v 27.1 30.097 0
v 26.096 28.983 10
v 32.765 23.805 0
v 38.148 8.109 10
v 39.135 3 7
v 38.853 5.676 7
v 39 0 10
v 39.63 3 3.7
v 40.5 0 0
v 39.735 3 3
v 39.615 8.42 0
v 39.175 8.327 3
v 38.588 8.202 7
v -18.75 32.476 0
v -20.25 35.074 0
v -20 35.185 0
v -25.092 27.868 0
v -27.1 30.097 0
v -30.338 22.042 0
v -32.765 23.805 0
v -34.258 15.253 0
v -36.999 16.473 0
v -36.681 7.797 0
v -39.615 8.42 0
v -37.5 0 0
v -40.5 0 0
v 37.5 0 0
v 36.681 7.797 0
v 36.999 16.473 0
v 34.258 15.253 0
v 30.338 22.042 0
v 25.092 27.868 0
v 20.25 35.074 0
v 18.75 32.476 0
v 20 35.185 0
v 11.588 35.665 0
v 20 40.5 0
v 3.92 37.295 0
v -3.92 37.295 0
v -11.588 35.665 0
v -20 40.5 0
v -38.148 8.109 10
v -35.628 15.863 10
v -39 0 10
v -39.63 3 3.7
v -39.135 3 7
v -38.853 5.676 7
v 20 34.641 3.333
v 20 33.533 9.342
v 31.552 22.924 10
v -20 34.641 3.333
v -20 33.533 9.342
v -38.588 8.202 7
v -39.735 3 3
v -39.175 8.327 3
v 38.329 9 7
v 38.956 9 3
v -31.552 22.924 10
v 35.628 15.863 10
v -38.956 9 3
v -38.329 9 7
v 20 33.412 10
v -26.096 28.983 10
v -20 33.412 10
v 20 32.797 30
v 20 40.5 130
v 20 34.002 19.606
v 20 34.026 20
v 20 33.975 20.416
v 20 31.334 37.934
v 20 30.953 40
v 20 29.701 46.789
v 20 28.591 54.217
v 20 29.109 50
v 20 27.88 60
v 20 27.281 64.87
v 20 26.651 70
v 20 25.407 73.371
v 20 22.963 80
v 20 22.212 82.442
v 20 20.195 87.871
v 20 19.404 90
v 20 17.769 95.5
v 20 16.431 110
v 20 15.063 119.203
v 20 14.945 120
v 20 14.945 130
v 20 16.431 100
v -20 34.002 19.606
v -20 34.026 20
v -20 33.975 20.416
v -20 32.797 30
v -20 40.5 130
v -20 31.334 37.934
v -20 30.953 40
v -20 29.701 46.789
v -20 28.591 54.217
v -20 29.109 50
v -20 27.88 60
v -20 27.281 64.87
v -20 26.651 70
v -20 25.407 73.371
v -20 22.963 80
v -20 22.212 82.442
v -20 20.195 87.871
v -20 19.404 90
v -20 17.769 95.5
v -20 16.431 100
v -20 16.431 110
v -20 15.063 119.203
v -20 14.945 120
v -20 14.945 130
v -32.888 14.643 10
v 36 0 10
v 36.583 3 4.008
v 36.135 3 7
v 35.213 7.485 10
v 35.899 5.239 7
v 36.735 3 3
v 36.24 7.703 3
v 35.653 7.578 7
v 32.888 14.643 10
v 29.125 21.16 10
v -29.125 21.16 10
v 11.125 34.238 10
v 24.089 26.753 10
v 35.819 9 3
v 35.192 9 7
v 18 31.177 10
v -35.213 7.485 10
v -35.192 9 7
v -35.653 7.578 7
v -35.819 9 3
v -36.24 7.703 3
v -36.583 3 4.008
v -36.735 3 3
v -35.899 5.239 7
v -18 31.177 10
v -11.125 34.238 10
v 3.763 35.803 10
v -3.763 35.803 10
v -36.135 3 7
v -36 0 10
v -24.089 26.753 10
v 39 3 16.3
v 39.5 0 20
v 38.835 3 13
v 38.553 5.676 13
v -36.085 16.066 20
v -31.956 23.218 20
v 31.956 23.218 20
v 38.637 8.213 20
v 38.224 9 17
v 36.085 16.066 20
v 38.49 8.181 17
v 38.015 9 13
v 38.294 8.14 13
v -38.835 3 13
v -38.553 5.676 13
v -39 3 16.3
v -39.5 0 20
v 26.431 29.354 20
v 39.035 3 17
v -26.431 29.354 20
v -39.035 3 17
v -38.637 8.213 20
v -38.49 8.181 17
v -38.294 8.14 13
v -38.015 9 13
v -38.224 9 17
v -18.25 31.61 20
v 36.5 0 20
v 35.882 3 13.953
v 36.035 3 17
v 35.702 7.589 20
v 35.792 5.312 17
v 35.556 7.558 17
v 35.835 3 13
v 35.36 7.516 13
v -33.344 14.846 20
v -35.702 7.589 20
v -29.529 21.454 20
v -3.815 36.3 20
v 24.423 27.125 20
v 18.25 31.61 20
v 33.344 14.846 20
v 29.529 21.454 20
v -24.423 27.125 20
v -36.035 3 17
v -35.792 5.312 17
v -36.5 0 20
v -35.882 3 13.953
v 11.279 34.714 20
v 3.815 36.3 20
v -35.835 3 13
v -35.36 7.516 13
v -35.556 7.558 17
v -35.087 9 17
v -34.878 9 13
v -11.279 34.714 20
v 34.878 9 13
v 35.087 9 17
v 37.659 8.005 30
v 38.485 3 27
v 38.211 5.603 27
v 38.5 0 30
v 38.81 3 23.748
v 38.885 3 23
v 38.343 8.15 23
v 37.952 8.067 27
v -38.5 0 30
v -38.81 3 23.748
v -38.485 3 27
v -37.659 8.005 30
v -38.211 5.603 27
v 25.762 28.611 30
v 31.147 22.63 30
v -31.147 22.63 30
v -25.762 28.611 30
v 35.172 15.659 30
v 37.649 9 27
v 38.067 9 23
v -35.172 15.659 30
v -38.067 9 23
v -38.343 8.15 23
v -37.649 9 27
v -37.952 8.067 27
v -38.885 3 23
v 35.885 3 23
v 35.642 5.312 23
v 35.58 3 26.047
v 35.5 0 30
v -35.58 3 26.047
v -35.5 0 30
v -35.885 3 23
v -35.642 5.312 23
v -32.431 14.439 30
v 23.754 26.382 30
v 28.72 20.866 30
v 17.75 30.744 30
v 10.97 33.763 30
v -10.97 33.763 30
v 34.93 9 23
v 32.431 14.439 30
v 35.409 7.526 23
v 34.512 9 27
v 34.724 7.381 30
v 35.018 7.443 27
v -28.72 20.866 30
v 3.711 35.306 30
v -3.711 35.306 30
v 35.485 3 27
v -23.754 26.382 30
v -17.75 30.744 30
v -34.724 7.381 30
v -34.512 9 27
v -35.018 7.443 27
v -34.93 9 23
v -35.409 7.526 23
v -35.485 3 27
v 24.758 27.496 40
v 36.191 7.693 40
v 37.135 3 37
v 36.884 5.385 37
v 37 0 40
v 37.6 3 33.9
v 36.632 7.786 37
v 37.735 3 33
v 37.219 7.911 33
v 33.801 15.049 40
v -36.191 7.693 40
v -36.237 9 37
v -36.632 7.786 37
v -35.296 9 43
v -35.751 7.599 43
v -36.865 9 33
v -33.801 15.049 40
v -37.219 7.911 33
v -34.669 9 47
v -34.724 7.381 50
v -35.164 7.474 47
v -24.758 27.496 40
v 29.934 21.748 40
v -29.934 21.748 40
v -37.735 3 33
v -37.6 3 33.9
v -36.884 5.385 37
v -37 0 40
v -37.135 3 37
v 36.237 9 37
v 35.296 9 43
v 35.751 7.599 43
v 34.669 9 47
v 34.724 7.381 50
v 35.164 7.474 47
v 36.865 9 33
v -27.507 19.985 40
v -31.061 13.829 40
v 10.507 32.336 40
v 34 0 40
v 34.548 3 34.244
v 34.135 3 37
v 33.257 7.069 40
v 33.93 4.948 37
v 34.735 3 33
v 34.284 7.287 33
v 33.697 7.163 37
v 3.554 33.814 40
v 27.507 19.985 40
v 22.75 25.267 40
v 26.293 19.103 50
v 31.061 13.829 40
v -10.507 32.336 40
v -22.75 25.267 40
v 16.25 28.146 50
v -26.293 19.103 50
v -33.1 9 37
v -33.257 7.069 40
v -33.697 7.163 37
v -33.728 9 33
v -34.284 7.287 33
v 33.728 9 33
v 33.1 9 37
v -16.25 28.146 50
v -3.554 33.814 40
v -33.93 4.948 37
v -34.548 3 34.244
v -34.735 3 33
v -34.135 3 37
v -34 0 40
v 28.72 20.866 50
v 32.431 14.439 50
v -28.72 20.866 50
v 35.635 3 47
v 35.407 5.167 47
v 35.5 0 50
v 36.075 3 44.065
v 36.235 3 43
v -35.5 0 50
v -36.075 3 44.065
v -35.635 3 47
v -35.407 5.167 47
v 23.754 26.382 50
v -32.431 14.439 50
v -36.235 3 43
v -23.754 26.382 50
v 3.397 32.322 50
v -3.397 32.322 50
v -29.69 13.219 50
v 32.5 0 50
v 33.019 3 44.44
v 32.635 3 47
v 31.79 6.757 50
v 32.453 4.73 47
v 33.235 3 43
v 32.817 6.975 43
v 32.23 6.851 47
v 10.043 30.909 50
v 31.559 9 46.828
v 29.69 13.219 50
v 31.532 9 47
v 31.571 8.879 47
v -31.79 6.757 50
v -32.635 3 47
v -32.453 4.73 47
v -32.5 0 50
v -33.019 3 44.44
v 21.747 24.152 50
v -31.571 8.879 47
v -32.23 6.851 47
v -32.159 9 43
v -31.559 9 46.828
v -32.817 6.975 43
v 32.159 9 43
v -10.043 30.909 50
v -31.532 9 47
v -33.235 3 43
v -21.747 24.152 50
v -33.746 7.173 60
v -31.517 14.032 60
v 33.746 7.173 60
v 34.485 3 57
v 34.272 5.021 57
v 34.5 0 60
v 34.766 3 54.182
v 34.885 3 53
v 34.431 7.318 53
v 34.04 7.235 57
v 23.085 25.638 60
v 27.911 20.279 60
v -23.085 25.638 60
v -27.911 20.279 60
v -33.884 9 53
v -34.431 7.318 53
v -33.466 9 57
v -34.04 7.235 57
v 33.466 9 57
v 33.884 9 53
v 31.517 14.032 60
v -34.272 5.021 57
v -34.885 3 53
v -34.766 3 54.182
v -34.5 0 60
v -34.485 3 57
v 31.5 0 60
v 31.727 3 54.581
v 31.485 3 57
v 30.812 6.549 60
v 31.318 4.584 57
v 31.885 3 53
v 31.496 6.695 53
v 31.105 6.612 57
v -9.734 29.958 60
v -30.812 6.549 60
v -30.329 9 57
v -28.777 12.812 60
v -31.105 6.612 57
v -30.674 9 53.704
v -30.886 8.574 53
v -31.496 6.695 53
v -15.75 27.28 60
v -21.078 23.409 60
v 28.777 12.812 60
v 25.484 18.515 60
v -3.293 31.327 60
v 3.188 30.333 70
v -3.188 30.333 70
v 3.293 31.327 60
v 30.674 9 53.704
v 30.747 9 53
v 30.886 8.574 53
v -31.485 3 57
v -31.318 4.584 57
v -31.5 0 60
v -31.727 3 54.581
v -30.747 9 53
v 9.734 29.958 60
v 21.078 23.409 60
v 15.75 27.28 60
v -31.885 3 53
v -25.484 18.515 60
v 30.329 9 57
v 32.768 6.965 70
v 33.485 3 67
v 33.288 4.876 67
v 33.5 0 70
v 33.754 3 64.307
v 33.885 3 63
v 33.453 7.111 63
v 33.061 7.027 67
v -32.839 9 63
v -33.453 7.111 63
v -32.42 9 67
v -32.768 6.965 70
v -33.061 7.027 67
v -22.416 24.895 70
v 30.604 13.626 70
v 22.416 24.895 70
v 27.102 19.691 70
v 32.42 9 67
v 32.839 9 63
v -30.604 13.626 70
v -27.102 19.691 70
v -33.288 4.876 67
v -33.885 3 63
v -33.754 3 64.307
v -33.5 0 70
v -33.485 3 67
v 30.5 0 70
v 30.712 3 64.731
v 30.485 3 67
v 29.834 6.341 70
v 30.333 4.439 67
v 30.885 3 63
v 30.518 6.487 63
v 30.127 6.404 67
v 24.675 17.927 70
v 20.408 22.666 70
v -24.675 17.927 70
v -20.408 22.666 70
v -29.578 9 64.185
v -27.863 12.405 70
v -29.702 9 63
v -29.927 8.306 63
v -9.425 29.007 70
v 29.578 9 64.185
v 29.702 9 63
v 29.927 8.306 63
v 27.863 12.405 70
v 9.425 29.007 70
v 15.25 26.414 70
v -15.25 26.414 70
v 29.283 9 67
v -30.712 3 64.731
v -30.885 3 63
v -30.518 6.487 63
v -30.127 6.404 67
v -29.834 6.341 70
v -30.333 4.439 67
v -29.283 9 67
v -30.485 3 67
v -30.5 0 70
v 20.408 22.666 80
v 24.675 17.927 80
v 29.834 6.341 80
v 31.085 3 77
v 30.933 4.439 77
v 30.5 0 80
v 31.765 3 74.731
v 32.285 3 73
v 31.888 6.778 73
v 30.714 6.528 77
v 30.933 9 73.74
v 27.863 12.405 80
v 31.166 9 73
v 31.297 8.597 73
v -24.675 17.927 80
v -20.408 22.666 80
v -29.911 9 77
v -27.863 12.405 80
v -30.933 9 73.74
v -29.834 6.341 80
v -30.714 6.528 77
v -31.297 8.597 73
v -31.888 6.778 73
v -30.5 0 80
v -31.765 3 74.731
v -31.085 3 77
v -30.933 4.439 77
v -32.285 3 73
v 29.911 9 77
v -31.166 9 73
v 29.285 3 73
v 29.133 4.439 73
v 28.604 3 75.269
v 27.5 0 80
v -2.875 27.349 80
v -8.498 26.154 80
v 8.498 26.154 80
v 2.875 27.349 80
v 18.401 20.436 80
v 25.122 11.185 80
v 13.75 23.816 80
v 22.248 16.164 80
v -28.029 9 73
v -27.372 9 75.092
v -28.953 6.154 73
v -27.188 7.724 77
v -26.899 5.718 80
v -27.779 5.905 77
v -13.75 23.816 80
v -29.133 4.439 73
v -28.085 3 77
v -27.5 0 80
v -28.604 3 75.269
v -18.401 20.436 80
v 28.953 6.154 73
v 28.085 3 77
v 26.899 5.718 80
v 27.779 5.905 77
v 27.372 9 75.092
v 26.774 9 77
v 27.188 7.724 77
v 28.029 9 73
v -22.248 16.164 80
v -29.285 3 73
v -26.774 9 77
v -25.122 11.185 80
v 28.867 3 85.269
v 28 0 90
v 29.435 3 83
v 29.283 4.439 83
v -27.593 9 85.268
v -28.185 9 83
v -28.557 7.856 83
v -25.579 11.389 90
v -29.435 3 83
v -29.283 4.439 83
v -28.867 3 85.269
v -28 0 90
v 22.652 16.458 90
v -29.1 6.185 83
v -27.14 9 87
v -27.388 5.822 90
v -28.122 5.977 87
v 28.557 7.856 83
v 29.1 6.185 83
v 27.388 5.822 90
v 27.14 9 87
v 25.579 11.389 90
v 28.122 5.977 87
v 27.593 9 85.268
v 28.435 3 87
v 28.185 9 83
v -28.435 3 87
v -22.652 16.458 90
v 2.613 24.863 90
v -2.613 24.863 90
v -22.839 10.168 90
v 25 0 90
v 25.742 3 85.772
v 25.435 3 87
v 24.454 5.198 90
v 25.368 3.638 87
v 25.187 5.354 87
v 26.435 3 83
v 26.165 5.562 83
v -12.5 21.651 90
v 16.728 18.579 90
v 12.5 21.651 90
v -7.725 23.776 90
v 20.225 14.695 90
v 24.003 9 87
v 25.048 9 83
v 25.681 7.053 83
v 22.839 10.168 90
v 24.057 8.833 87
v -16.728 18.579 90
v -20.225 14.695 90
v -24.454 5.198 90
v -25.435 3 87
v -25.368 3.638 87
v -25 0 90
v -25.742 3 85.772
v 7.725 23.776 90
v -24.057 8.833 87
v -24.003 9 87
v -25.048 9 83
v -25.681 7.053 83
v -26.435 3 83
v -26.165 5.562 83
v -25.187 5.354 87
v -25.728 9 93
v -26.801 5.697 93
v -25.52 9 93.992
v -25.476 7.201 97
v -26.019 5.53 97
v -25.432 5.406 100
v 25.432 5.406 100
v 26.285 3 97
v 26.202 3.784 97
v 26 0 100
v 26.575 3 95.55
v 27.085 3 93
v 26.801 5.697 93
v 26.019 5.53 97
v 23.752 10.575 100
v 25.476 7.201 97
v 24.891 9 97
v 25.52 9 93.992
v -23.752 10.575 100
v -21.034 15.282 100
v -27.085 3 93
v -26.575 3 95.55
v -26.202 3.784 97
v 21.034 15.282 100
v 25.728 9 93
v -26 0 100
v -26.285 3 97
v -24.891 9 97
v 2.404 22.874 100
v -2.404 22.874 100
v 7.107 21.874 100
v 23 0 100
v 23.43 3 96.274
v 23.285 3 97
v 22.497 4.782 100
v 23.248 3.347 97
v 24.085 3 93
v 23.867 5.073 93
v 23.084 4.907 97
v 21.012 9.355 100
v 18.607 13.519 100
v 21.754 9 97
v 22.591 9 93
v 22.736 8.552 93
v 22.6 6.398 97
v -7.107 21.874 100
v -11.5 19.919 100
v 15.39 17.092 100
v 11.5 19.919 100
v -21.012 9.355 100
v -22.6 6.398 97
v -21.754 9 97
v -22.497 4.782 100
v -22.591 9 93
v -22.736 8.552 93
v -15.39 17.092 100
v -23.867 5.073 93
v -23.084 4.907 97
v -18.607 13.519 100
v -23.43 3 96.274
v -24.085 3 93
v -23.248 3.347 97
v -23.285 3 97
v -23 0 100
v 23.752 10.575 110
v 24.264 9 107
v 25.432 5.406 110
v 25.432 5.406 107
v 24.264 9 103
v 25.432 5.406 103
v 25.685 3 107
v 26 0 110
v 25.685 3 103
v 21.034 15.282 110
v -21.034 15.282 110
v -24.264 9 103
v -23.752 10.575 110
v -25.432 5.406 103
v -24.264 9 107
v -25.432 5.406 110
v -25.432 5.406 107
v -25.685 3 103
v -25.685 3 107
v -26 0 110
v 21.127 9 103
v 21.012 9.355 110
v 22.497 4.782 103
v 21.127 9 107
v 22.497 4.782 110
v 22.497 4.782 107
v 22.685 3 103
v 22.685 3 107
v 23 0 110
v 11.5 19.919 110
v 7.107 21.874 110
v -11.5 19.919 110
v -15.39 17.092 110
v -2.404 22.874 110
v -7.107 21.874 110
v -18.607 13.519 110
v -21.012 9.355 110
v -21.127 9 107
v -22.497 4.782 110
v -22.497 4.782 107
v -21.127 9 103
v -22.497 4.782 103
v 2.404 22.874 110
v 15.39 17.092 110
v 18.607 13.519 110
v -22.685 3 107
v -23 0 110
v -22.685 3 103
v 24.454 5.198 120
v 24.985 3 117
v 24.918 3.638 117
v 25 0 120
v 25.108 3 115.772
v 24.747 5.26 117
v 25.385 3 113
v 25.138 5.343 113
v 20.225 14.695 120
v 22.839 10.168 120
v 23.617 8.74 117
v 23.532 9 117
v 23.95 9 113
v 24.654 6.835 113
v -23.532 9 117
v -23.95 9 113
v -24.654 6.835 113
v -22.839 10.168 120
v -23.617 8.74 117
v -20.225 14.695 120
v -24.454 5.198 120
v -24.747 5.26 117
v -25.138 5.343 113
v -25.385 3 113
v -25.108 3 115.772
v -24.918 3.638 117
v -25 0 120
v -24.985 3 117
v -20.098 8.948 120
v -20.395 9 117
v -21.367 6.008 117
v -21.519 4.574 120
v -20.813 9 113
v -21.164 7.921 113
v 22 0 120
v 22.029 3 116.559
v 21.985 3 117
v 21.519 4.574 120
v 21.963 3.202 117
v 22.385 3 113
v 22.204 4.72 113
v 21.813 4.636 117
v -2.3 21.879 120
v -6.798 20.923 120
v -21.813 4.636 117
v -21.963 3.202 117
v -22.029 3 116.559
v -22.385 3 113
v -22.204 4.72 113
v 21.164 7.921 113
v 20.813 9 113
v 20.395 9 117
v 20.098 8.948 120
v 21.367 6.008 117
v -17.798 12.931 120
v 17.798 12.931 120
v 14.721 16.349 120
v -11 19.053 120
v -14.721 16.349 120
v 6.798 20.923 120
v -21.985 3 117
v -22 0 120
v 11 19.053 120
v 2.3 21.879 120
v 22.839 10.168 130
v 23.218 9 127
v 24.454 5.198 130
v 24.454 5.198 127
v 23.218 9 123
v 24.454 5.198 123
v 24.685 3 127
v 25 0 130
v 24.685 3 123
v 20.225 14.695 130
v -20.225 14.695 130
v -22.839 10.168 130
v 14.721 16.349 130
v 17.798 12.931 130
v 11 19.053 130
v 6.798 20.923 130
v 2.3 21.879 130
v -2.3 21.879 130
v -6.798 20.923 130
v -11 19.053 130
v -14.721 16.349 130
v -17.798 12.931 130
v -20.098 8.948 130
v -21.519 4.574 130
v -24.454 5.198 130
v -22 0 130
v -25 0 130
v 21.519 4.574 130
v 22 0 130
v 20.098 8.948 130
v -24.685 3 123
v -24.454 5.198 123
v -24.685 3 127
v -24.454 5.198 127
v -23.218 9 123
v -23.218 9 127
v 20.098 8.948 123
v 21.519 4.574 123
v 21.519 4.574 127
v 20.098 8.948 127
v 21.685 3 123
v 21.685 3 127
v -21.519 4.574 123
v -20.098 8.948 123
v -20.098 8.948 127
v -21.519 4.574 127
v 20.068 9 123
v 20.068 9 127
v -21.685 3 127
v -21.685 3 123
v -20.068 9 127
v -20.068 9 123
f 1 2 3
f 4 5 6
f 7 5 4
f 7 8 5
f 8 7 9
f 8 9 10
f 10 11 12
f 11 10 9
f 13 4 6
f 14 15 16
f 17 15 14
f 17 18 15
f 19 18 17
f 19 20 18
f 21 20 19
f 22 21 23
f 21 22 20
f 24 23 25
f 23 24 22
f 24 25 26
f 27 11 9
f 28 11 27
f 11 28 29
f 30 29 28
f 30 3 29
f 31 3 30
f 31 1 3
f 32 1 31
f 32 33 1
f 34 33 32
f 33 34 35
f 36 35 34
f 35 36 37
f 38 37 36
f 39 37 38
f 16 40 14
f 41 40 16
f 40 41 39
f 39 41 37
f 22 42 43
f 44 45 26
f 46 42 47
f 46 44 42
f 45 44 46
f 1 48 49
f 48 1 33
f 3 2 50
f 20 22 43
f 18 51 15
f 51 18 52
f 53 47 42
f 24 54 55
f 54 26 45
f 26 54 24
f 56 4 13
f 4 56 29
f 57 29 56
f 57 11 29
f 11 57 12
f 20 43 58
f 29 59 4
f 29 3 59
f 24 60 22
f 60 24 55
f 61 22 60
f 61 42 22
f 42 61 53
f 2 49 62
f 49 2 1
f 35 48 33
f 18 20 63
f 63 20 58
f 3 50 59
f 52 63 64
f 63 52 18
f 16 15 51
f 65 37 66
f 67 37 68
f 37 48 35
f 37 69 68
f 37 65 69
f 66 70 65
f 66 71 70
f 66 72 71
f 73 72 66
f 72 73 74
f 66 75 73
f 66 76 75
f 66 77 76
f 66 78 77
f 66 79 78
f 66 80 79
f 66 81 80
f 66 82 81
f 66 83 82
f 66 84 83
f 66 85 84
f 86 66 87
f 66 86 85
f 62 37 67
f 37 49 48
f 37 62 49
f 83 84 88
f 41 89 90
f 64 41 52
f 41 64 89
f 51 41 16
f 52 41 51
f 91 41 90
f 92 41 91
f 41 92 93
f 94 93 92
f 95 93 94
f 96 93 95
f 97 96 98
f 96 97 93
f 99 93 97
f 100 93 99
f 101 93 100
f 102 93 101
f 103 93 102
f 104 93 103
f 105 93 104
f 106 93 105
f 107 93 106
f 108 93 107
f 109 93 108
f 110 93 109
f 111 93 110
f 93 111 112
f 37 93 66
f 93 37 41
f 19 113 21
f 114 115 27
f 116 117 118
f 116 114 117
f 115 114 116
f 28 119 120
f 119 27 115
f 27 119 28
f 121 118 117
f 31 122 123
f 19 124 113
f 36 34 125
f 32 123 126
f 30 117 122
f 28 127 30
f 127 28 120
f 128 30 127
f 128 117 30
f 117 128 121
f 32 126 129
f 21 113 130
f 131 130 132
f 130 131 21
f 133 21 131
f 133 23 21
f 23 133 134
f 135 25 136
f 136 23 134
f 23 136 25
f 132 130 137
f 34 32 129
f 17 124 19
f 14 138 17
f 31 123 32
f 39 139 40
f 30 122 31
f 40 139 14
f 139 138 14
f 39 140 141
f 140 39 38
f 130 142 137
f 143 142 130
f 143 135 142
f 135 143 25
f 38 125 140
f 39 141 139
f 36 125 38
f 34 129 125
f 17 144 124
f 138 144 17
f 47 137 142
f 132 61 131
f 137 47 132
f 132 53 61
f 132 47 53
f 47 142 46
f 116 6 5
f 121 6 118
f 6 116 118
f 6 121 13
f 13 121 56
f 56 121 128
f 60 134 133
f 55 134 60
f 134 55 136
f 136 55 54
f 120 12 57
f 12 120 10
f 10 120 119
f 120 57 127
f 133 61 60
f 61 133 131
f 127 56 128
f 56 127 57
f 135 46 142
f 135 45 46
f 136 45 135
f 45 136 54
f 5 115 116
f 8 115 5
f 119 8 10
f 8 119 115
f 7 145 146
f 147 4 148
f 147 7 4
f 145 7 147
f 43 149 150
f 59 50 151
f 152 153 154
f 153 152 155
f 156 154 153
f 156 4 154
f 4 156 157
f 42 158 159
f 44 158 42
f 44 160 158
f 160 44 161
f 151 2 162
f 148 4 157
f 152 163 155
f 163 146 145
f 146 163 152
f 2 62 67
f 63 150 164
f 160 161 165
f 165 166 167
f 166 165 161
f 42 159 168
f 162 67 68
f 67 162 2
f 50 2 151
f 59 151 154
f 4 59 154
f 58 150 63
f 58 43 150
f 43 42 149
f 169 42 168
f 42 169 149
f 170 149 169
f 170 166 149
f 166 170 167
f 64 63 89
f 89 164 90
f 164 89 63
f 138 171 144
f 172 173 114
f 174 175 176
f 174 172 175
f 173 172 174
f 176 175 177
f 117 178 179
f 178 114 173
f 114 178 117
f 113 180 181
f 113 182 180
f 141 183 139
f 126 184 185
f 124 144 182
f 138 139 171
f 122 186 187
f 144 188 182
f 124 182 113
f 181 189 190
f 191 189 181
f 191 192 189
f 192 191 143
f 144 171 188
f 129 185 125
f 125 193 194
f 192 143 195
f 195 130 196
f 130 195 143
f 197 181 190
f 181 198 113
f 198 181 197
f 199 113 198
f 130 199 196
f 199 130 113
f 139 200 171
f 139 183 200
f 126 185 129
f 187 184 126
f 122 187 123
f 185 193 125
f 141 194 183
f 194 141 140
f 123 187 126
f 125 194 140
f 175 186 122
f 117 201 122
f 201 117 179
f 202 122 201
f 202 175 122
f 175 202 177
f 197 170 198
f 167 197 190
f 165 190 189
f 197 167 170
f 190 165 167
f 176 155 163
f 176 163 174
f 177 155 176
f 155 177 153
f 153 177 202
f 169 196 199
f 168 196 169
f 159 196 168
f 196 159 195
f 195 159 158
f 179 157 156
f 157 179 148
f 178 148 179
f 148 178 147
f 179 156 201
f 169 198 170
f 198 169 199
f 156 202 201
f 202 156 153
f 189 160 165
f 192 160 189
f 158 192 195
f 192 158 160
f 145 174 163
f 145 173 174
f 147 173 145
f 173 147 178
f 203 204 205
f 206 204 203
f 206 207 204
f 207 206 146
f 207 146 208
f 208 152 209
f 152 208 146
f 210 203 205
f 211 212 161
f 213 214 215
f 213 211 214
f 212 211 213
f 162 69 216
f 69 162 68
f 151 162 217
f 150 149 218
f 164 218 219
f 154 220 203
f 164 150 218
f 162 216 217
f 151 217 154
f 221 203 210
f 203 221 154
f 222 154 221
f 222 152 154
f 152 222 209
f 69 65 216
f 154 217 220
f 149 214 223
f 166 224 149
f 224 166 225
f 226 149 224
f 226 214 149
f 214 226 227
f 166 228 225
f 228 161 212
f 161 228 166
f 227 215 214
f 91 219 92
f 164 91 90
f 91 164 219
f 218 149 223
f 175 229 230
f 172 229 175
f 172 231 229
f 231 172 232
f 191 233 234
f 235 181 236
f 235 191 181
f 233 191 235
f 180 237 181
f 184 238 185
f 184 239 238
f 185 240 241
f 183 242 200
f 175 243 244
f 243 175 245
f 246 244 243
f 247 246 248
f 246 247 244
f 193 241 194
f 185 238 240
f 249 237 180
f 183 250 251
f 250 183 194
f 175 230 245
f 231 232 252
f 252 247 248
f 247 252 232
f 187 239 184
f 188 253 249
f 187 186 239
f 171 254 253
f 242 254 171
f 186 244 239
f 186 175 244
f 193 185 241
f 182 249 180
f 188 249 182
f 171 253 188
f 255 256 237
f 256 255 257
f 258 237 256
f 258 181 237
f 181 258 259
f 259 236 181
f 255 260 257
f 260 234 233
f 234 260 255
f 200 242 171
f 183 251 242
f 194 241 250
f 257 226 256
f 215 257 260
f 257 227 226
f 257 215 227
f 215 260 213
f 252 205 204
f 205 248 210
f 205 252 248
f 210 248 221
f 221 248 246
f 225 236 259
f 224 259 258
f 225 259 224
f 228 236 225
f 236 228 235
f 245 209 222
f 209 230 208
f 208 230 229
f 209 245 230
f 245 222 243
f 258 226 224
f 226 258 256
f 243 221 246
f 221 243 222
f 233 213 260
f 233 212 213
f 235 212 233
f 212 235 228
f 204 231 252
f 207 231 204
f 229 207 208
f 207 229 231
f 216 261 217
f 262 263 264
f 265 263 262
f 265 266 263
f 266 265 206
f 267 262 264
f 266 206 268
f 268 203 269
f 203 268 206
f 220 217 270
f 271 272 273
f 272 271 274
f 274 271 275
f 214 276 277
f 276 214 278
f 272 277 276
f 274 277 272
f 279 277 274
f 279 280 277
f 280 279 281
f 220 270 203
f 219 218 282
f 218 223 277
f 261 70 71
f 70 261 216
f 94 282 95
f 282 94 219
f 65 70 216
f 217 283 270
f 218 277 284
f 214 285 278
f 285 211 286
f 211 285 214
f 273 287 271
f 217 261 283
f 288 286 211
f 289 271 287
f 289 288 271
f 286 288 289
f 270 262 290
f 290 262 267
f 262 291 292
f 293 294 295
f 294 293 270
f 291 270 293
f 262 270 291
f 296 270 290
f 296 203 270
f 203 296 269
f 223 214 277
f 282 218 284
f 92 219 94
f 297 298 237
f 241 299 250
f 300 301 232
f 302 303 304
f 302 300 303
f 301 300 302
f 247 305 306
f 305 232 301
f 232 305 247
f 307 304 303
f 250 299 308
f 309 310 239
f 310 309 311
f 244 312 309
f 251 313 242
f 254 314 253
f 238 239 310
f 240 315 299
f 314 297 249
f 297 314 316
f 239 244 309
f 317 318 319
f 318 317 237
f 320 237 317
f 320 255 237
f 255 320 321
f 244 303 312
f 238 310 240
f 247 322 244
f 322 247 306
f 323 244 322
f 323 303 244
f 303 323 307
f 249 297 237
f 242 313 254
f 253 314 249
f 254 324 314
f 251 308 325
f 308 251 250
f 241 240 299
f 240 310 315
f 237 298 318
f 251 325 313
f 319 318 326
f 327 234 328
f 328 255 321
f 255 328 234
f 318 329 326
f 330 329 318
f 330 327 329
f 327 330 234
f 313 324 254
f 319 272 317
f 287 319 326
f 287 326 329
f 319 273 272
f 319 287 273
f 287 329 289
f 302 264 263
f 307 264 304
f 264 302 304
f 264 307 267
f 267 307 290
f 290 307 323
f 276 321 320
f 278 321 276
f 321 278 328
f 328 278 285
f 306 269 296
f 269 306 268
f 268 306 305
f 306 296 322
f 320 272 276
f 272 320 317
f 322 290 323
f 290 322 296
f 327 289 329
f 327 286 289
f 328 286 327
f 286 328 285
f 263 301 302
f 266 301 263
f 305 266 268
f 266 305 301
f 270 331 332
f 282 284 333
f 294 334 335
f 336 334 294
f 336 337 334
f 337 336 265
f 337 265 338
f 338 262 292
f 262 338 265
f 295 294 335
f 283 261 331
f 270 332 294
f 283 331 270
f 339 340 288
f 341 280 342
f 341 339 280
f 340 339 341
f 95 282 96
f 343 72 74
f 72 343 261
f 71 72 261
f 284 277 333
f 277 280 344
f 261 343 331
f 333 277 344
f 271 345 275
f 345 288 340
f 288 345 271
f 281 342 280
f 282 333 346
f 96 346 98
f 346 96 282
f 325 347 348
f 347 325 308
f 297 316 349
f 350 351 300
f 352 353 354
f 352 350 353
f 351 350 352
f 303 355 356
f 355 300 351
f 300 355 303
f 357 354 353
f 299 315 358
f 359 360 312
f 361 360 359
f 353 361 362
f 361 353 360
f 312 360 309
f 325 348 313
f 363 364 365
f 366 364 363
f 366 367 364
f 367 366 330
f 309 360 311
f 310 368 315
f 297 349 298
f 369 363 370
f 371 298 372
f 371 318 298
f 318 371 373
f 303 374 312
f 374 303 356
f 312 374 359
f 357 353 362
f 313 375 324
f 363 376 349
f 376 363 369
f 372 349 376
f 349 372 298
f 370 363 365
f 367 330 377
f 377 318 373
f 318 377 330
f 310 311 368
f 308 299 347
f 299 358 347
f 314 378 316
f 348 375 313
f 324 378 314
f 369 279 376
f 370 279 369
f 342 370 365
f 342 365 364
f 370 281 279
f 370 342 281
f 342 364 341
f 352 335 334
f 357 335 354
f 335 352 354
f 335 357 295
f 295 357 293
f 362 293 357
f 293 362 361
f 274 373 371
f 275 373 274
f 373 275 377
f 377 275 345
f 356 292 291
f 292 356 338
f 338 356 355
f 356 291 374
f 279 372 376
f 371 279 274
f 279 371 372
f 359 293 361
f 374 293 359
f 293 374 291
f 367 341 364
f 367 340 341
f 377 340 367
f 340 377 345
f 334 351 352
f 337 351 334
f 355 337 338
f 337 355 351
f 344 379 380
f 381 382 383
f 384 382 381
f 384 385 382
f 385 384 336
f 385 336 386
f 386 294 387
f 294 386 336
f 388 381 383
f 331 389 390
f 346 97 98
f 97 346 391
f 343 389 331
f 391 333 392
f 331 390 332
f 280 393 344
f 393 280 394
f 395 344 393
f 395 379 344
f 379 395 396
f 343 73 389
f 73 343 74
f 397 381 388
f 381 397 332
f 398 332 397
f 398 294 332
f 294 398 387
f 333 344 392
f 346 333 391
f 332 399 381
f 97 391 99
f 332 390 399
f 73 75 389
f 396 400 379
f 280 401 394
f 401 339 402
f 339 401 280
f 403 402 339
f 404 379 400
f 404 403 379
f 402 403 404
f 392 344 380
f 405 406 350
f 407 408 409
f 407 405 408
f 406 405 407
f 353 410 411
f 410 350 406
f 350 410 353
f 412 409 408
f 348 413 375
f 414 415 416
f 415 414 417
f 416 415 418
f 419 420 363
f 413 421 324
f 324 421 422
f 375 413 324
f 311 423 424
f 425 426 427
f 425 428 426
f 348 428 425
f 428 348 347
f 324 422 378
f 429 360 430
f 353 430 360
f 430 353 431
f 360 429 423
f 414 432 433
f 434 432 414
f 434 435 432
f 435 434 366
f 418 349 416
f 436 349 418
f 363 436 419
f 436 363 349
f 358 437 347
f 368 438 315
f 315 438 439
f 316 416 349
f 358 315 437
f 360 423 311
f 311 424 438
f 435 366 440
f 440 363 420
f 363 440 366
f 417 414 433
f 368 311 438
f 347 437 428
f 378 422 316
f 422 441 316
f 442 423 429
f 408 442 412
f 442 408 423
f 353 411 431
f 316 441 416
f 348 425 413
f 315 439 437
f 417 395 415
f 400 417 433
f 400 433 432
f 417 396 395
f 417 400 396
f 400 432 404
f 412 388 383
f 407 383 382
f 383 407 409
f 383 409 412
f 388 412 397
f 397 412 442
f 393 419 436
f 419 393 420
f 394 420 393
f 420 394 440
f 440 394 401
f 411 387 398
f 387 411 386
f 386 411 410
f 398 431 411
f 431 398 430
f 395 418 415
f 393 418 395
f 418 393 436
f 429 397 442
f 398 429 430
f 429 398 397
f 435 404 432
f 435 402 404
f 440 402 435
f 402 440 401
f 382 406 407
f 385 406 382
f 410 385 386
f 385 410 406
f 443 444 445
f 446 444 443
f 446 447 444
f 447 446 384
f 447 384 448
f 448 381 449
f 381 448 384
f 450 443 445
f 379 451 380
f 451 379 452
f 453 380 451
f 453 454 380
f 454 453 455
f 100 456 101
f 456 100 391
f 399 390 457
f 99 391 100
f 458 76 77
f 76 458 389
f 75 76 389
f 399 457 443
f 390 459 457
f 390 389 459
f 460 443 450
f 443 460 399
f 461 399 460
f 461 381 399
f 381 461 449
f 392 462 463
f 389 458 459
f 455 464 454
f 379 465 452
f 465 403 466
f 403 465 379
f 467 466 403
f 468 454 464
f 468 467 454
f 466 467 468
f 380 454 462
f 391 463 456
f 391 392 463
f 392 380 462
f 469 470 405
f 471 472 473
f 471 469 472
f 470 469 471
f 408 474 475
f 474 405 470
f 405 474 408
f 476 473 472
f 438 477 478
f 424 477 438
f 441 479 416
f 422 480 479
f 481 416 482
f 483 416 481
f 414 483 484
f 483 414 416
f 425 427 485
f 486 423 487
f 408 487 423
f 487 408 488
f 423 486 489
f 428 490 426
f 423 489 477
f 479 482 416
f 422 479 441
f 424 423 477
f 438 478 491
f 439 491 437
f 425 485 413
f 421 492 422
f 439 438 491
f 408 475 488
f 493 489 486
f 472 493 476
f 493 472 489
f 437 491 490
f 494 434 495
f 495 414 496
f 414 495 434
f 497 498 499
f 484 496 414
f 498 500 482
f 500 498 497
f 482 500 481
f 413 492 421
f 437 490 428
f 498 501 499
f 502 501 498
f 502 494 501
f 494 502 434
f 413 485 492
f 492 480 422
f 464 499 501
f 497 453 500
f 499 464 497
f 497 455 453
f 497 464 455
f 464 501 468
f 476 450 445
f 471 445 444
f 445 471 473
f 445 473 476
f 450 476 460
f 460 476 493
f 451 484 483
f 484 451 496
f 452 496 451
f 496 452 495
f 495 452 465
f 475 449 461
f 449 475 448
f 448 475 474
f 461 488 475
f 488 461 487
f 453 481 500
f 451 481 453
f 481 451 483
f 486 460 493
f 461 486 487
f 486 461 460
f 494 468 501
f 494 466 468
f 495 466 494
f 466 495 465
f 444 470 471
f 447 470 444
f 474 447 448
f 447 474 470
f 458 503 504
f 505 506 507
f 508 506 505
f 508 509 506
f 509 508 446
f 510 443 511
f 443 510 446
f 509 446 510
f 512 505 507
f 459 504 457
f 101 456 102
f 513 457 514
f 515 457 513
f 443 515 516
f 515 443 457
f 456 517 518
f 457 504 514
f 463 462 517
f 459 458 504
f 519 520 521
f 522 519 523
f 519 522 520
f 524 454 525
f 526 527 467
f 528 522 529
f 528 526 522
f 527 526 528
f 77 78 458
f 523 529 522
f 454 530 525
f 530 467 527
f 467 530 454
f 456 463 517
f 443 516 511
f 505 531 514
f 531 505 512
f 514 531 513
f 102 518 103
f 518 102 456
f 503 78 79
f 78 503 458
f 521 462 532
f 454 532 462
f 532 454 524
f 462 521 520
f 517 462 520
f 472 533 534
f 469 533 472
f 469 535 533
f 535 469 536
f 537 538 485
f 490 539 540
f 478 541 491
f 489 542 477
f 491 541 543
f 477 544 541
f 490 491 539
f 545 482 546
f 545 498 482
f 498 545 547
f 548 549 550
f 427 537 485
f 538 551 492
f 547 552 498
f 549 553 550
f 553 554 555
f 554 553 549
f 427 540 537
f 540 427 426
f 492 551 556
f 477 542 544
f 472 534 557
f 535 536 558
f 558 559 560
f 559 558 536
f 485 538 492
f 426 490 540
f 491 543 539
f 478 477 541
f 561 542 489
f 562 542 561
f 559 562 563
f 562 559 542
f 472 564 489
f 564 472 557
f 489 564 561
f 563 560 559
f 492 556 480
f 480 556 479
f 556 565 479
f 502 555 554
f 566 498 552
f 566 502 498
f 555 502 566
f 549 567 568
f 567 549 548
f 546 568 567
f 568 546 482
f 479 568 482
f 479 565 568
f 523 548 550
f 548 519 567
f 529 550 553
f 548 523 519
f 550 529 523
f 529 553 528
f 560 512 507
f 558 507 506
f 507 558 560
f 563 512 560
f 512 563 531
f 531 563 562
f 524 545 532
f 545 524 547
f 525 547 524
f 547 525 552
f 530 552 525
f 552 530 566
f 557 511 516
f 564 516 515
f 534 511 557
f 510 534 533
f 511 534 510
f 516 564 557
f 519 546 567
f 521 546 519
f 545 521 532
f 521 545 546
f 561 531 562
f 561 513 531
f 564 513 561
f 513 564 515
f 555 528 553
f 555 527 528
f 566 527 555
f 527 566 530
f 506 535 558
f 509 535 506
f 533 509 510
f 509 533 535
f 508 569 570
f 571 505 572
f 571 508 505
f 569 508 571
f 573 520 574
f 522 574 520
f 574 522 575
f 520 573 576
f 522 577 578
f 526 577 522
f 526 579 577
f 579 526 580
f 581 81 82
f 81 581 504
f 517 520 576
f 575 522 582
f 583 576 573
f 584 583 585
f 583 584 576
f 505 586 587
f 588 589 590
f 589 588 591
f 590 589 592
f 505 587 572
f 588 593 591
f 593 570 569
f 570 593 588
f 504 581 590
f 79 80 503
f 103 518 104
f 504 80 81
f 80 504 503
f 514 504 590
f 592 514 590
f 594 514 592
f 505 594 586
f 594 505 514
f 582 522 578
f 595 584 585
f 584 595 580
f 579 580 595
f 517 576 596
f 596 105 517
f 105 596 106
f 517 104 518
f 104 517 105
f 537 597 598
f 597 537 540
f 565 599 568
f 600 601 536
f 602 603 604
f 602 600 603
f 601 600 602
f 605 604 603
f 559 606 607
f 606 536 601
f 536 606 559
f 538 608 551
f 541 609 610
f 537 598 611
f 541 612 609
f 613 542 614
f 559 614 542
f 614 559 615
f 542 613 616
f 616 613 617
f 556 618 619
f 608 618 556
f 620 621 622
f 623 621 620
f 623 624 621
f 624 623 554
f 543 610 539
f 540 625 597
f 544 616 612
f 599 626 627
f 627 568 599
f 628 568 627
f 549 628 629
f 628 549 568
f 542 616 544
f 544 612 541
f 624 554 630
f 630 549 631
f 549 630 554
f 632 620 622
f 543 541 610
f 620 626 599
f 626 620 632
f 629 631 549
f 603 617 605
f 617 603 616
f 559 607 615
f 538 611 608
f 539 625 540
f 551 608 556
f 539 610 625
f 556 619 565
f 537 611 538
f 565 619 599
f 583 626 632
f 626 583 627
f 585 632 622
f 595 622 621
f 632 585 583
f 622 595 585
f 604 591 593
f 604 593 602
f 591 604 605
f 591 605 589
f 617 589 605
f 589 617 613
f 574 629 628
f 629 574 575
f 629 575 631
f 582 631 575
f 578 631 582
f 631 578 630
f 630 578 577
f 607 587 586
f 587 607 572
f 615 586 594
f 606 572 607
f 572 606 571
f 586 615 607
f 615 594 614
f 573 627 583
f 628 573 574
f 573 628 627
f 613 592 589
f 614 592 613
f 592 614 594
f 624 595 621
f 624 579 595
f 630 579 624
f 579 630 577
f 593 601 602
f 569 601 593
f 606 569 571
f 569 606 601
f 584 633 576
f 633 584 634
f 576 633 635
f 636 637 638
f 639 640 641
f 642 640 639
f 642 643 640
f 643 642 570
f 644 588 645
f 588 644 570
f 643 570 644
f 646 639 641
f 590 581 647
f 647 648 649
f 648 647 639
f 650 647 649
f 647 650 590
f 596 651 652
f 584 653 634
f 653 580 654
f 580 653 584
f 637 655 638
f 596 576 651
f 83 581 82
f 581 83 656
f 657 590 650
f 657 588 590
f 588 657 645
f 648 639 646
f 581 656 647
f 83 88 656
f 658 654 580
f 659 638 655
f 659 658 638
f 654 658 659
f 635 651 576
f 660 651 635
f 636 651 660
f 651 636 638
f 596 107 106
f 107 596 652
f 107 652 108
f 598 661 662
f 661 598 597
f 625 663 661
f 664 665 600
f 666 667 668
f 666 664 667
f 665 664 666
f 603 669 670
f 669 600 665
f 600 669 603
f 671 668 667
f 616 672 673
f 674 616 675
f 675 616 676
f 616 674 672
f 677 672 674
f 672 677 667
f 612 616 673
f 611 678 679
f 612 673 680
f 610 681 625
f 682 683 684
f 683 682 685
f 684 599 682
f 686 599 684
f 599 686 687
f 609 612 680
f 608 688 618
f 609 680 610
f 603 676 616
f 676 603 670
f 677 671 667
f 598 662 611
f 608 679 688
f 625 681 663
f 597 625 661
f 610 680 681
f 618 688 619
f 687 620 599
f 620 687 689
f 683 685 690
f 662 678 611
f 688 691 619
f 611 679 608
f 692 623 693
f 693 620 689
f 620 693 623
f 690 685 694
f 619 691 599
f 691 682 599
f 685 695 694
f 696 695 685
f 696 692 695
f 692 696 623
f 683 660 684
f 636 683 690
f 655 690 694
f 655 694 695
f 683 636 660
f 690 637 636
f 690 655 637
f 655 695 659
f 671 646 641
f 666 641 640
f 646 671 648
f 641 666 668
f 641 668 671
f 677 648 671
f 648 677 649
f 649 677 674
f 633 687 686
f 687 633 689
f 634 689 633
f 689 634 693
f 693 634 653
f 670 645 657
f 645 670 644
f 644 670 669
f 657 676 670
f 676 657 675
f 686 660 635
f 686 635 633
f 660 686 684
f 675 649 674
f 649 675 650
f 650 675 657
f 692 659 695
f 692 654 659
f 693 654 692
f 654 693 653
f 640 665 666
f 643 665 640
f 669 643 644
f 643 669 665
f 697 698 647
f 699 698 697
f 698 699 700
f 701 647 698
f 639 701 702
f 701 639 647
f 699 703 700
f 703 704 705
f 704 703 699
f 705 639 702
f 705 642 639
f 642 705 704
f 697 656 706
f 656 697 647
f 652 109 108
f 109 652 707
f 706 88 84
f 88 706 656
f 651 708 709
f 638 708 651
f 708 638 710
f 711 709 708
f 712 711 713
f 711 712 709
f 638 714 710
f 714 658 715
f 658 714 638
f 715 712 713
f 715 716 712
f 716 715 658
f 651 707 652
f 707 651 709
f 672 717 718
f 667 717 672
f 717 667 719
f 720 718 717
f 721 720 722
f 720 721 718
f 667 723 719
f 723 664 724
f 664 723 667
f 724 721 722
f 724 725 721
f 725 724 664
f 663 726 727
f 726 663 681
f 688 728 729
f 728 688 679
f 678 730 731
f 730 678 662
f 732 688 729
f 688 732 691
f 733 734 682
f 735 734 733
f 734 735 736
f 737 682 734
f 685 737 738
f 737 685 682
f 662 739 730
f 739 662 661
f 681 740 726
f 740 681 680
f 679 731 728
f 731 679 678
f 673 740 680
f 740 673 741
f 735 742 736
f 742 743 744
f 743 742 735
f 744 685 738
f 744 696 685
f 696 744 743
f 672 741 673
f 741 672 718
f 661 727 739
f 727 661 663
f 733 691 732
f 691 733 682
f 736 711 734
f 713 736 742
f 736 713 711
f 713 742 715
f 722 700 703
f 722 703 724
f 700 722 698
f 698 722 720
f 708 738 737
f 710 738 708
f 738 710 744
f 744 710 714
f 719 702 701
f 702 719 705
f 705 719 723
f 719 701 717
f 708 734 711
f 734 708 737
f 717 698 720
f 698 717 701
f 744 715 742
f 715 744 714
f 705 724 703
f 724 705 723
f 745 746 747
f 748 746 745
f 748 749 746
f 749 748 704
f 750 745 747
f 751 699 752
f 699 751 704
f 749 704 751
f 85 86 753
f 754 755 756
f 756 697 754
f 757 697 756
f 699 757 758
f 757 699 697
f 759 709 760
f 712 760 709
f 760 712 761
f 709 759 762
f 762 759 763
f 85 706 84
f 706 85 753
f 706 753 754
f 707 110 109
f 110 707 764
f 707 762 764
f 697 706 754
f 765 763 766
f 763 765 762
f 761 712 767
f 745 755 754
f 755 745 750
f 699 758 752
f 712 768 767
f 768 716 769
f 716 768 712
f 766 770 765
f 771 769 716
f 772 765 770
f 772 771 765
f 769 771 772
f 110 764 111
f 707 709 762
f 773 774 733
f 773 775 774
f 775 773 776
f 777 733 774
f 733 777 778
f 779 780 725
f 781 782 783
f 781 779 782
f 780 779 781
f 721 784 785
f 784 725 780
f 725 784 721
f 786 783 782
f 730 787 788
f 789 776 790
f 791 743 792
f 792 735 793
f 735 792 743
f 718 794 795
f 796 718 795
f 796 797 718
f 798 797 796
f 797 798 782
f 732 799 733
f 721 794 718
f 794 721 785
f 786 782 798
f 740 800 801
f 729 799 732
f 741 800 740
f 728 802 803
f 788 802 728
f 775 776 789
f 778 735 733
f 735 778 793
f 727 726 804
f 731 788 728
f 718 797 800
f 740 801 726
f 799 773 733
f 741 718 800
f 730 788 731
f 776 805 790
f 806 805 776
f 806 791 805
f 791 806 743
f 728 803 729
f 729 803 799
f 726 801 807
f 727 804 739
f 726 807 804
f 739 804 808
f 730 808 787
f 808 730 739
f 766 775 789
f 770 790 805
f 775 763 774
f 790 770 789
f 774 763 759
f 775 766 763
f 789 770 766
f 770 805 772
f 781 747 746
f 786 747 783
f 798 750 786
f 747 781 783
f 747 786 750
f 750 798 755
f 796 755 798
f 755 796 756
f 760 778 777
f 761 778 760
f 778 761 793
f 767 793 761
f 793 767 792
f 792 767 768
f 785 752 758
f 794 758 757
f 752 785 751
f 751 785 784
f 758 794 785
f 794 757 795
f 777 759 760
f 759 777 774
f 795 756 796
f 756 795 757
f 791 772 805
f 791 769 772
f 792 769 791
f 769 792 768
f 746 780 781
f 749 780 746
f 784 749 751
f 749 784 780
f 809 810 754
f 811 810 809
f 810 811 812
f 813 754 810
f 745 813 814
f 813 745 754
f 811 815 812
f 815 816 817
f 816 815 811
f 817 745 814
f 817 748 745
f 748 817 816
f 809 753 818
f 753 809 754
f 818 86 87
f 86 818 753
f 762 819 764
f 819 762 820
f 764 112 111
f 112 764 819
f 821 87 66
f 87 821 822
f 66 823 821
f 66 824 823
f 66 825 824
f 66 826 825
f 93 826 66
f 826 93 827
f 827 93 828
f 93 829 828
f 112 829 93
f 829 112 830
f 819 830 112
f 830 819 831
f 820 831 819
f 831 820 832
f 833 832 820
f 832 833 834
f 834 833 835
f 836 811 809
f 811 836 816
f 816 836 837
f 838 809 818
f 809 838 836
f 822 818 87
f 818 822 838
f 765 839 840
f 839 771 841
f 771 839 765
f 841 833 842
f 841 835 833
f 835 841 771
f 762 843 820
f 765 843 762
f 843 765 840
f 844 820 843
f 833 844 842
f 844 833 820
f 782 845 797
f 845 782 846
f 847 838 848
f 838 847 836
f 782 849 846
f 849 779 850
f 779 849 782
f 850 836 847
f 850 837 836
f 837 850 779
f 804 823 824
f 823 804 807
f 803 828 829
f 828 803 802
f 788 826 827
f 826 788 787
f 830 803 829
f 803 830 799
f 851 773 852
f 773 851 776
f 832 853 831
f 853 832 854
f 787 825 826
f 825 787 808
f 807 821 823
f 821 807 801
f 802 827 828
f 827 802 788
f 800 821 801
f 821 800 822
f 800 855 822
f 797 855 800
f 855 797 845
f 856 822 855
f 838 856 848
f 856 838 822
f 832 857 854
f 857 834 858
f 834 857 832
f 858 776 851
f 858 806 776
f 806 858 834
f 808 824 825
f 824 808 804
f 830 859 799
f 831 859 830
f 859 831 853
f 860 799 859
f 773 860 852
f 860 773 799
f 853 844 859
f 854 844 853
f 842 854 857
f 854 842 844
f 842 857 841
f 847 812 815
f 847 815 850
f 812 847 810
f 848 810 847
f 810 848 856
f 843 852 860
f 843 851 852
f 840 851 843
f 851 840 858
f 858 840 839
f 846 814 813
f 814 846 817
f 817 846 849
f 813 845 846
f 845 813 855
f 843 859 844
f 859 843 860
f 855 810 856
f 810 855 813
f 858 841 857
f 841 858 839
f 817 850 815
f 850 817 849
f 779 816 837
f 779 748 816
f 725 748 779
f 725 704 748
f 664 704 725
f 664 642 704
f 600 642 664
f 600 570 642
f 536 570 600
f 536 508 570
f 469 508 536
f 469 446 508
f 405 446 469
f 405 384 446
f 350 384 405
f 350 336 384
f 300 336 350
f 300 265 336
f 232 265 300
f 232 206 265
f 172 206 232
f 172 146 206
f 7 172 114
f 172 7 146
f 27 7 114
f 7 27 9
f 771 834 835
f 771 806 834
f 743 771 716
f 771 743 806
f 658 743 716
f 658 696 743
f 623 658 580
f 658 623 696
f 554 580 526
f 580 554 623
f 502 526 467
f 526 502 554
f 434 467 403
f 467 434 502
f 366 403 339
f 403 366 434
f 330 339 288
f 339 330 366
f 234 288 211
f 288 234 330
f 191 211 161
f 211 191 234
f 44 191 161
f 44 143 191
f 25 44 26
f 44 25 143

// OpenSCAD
difference()  {
union()  {
translate([0.0,0.0,0.0])difference()  {
union()  {
cylinder(r1=40.5,r2=39.0,h=10.0);
translate([-20.0,0.0,0.0])cube([40.0,40.5,10.0]);
}
cylinder(r1=37.5,r2=36.0,h=10.0);
translate([-40.5,3.0,3.0])cube([81.0,6.0,4.0]);
}
translate([0.0,0.0,10.0])difference()  {
union()  {
cylinder(r1=39.0,r2=39.5,h=10.0);
translate([-20.0,0.0,0.0])cube([40.0,40.5,10.0]);
}
cylinder(r1=36.0,r2=36.5,h=10.0);
translate([-40.5,3.0,3.0])cube([81.0,6.0,4.0]);
}
translate([0.0,0.0,20.0])difference()  {
union()  {
cylinder(r1=39.5,r2=38.5,h=10.0);
translate([-20.0,0.0,0.0])cube([40.0,40.5,10.0]);
}
cylinder(r1=36.5,r2=35.5,h=10.0);
translate([-40.5,3.0,3.0])cube([81.0,6.0,4.0]);
}
translate([0.0,0.0,30.0])difference()  {
union()  {
cylinder(r1=38.5,r2=37.0,h=10.0);
translate([-20.0,0.0,0.0])cube([40.0,40.5,10.0]);
}
cylinder(r1=35.5,r2=34.0,h=10.0);
translate([-40.5,3.0,3.0])cube([81.0,6.0,4.0]);
}
translate([0.0,0.0,40.0])difference()  {
union()  {
cylinder(r1=37.0,r2=35.5,h=10.0);
translate([-20.0,0.0,0.0])cube([40.0,40.5,10.0]);
}
cylinder(r1=34.0,r2=32.5,h=10.0);
translate([-40.5,3.0,3.0])cube([81.0,6.0,4.0]);
}
translate([0.0,0.0,50.0])difference()  {
union()  {
cylinder(r1=35.5,r2=34.5,h=10.0);
translate([-20.0,0.0,0.0])cube([40.0,40.5,10.0]);
}
cylinder(r1=32.5,r2=31.5,h=10.0);
translate([-40.5,3.0,3.0])cube([81.0,6.0,4.0]);
}
translate([0.0,0.0,60.0])difference()  {
union()  {
cylinder(r1=34.5,r2=33.5,h=10.0);
translate([-20.0,0.0,0.0])cube([40.0,40.5,10.0]);
}
cylinder(r1=31.5,r2=30.5,h=10.0);
translate([-40.5,3.0,3.0])cube([81.0,6.0,4.0]);
}
translate([0.0,0.0,70.0])difference()  {
union()  {
cylinder(r1=33.5,r2=30.5,h=10.0);
translate([-20.0,0.0,0.0])cube([40.0,40.5,10.0]);
}
cylinder(r1=30.5,r2=27.5,h=10.0);
translate([-40.5,3.0,3.0])cube([81.0,6.0,4.0]);
}
translate([0.0,0.0,80.0])difference()  {
union()  {
cylinder(r1=30.5,r2=28.0,h=10.0);
translate([-20.0,0.0,0.0])cube([40.0,40.5,10.0]);
}
cylinder(r1=27.5,r2=25.0,h=10.0);
translate([-40.5,3.0,3.0])cube([81.0,6.0,4.0]);
}
translate([0.0,0.0,90.0])difference()  {
union()  {
cylinder(r1=28.0,r2=26.0,h=10.0);
translate([-20.0,0.0,0.0])cube([40.0,40.5,10.0]);
}
cylinder(r1=25.0,r2=23.0,h=10.0);
translate([-40.5,3.0,3.0])cube([81.0,6.0,4.0]);
}
translate([0.0,0.0,100.0])difference()  {
union()  {
cylinder(r1=26.0,r2=26.0,h=10.0);
translate([-20.0,0.0,0.0])cube([40.0,40.5,10.0]);
}
cylinder(r1=23.0,r2=23.0,h=10.0);
translate([-40.5,3.0,3.0])cube([81.0,6.0,4.0]);
}
translate([0.0,0.0,110.0])difference()  {
union()  {
cylinder(r1=26.0,r2=25.0,h=10.0);
translate([-20.0,0.0,0.0])cube([40.0,40.5,10.0]);
}
cylinder(r1=23.0,r2=22.0,h=10.0);
translate([-40.5,3.0,3.0])cube([81.0,6.0,4.0]);
}
translate([0.0,0.0,120.0])difference()  {
union()  {
cylinder(r1=25.0,r2=25.0,h=10.0);
translate([-20.0,0.0,0.0])cube([40.0,40.5,10.0]);
}
cylinder(r1=22.0,r2=22.0,h=10.0);
translate([-40.5,3.0,3.0])cube([81.0,6.0,4.0]);
}
}
translate([-40.5,-40.5,0.0])cube([81.0,40.5,140.0]);
}
